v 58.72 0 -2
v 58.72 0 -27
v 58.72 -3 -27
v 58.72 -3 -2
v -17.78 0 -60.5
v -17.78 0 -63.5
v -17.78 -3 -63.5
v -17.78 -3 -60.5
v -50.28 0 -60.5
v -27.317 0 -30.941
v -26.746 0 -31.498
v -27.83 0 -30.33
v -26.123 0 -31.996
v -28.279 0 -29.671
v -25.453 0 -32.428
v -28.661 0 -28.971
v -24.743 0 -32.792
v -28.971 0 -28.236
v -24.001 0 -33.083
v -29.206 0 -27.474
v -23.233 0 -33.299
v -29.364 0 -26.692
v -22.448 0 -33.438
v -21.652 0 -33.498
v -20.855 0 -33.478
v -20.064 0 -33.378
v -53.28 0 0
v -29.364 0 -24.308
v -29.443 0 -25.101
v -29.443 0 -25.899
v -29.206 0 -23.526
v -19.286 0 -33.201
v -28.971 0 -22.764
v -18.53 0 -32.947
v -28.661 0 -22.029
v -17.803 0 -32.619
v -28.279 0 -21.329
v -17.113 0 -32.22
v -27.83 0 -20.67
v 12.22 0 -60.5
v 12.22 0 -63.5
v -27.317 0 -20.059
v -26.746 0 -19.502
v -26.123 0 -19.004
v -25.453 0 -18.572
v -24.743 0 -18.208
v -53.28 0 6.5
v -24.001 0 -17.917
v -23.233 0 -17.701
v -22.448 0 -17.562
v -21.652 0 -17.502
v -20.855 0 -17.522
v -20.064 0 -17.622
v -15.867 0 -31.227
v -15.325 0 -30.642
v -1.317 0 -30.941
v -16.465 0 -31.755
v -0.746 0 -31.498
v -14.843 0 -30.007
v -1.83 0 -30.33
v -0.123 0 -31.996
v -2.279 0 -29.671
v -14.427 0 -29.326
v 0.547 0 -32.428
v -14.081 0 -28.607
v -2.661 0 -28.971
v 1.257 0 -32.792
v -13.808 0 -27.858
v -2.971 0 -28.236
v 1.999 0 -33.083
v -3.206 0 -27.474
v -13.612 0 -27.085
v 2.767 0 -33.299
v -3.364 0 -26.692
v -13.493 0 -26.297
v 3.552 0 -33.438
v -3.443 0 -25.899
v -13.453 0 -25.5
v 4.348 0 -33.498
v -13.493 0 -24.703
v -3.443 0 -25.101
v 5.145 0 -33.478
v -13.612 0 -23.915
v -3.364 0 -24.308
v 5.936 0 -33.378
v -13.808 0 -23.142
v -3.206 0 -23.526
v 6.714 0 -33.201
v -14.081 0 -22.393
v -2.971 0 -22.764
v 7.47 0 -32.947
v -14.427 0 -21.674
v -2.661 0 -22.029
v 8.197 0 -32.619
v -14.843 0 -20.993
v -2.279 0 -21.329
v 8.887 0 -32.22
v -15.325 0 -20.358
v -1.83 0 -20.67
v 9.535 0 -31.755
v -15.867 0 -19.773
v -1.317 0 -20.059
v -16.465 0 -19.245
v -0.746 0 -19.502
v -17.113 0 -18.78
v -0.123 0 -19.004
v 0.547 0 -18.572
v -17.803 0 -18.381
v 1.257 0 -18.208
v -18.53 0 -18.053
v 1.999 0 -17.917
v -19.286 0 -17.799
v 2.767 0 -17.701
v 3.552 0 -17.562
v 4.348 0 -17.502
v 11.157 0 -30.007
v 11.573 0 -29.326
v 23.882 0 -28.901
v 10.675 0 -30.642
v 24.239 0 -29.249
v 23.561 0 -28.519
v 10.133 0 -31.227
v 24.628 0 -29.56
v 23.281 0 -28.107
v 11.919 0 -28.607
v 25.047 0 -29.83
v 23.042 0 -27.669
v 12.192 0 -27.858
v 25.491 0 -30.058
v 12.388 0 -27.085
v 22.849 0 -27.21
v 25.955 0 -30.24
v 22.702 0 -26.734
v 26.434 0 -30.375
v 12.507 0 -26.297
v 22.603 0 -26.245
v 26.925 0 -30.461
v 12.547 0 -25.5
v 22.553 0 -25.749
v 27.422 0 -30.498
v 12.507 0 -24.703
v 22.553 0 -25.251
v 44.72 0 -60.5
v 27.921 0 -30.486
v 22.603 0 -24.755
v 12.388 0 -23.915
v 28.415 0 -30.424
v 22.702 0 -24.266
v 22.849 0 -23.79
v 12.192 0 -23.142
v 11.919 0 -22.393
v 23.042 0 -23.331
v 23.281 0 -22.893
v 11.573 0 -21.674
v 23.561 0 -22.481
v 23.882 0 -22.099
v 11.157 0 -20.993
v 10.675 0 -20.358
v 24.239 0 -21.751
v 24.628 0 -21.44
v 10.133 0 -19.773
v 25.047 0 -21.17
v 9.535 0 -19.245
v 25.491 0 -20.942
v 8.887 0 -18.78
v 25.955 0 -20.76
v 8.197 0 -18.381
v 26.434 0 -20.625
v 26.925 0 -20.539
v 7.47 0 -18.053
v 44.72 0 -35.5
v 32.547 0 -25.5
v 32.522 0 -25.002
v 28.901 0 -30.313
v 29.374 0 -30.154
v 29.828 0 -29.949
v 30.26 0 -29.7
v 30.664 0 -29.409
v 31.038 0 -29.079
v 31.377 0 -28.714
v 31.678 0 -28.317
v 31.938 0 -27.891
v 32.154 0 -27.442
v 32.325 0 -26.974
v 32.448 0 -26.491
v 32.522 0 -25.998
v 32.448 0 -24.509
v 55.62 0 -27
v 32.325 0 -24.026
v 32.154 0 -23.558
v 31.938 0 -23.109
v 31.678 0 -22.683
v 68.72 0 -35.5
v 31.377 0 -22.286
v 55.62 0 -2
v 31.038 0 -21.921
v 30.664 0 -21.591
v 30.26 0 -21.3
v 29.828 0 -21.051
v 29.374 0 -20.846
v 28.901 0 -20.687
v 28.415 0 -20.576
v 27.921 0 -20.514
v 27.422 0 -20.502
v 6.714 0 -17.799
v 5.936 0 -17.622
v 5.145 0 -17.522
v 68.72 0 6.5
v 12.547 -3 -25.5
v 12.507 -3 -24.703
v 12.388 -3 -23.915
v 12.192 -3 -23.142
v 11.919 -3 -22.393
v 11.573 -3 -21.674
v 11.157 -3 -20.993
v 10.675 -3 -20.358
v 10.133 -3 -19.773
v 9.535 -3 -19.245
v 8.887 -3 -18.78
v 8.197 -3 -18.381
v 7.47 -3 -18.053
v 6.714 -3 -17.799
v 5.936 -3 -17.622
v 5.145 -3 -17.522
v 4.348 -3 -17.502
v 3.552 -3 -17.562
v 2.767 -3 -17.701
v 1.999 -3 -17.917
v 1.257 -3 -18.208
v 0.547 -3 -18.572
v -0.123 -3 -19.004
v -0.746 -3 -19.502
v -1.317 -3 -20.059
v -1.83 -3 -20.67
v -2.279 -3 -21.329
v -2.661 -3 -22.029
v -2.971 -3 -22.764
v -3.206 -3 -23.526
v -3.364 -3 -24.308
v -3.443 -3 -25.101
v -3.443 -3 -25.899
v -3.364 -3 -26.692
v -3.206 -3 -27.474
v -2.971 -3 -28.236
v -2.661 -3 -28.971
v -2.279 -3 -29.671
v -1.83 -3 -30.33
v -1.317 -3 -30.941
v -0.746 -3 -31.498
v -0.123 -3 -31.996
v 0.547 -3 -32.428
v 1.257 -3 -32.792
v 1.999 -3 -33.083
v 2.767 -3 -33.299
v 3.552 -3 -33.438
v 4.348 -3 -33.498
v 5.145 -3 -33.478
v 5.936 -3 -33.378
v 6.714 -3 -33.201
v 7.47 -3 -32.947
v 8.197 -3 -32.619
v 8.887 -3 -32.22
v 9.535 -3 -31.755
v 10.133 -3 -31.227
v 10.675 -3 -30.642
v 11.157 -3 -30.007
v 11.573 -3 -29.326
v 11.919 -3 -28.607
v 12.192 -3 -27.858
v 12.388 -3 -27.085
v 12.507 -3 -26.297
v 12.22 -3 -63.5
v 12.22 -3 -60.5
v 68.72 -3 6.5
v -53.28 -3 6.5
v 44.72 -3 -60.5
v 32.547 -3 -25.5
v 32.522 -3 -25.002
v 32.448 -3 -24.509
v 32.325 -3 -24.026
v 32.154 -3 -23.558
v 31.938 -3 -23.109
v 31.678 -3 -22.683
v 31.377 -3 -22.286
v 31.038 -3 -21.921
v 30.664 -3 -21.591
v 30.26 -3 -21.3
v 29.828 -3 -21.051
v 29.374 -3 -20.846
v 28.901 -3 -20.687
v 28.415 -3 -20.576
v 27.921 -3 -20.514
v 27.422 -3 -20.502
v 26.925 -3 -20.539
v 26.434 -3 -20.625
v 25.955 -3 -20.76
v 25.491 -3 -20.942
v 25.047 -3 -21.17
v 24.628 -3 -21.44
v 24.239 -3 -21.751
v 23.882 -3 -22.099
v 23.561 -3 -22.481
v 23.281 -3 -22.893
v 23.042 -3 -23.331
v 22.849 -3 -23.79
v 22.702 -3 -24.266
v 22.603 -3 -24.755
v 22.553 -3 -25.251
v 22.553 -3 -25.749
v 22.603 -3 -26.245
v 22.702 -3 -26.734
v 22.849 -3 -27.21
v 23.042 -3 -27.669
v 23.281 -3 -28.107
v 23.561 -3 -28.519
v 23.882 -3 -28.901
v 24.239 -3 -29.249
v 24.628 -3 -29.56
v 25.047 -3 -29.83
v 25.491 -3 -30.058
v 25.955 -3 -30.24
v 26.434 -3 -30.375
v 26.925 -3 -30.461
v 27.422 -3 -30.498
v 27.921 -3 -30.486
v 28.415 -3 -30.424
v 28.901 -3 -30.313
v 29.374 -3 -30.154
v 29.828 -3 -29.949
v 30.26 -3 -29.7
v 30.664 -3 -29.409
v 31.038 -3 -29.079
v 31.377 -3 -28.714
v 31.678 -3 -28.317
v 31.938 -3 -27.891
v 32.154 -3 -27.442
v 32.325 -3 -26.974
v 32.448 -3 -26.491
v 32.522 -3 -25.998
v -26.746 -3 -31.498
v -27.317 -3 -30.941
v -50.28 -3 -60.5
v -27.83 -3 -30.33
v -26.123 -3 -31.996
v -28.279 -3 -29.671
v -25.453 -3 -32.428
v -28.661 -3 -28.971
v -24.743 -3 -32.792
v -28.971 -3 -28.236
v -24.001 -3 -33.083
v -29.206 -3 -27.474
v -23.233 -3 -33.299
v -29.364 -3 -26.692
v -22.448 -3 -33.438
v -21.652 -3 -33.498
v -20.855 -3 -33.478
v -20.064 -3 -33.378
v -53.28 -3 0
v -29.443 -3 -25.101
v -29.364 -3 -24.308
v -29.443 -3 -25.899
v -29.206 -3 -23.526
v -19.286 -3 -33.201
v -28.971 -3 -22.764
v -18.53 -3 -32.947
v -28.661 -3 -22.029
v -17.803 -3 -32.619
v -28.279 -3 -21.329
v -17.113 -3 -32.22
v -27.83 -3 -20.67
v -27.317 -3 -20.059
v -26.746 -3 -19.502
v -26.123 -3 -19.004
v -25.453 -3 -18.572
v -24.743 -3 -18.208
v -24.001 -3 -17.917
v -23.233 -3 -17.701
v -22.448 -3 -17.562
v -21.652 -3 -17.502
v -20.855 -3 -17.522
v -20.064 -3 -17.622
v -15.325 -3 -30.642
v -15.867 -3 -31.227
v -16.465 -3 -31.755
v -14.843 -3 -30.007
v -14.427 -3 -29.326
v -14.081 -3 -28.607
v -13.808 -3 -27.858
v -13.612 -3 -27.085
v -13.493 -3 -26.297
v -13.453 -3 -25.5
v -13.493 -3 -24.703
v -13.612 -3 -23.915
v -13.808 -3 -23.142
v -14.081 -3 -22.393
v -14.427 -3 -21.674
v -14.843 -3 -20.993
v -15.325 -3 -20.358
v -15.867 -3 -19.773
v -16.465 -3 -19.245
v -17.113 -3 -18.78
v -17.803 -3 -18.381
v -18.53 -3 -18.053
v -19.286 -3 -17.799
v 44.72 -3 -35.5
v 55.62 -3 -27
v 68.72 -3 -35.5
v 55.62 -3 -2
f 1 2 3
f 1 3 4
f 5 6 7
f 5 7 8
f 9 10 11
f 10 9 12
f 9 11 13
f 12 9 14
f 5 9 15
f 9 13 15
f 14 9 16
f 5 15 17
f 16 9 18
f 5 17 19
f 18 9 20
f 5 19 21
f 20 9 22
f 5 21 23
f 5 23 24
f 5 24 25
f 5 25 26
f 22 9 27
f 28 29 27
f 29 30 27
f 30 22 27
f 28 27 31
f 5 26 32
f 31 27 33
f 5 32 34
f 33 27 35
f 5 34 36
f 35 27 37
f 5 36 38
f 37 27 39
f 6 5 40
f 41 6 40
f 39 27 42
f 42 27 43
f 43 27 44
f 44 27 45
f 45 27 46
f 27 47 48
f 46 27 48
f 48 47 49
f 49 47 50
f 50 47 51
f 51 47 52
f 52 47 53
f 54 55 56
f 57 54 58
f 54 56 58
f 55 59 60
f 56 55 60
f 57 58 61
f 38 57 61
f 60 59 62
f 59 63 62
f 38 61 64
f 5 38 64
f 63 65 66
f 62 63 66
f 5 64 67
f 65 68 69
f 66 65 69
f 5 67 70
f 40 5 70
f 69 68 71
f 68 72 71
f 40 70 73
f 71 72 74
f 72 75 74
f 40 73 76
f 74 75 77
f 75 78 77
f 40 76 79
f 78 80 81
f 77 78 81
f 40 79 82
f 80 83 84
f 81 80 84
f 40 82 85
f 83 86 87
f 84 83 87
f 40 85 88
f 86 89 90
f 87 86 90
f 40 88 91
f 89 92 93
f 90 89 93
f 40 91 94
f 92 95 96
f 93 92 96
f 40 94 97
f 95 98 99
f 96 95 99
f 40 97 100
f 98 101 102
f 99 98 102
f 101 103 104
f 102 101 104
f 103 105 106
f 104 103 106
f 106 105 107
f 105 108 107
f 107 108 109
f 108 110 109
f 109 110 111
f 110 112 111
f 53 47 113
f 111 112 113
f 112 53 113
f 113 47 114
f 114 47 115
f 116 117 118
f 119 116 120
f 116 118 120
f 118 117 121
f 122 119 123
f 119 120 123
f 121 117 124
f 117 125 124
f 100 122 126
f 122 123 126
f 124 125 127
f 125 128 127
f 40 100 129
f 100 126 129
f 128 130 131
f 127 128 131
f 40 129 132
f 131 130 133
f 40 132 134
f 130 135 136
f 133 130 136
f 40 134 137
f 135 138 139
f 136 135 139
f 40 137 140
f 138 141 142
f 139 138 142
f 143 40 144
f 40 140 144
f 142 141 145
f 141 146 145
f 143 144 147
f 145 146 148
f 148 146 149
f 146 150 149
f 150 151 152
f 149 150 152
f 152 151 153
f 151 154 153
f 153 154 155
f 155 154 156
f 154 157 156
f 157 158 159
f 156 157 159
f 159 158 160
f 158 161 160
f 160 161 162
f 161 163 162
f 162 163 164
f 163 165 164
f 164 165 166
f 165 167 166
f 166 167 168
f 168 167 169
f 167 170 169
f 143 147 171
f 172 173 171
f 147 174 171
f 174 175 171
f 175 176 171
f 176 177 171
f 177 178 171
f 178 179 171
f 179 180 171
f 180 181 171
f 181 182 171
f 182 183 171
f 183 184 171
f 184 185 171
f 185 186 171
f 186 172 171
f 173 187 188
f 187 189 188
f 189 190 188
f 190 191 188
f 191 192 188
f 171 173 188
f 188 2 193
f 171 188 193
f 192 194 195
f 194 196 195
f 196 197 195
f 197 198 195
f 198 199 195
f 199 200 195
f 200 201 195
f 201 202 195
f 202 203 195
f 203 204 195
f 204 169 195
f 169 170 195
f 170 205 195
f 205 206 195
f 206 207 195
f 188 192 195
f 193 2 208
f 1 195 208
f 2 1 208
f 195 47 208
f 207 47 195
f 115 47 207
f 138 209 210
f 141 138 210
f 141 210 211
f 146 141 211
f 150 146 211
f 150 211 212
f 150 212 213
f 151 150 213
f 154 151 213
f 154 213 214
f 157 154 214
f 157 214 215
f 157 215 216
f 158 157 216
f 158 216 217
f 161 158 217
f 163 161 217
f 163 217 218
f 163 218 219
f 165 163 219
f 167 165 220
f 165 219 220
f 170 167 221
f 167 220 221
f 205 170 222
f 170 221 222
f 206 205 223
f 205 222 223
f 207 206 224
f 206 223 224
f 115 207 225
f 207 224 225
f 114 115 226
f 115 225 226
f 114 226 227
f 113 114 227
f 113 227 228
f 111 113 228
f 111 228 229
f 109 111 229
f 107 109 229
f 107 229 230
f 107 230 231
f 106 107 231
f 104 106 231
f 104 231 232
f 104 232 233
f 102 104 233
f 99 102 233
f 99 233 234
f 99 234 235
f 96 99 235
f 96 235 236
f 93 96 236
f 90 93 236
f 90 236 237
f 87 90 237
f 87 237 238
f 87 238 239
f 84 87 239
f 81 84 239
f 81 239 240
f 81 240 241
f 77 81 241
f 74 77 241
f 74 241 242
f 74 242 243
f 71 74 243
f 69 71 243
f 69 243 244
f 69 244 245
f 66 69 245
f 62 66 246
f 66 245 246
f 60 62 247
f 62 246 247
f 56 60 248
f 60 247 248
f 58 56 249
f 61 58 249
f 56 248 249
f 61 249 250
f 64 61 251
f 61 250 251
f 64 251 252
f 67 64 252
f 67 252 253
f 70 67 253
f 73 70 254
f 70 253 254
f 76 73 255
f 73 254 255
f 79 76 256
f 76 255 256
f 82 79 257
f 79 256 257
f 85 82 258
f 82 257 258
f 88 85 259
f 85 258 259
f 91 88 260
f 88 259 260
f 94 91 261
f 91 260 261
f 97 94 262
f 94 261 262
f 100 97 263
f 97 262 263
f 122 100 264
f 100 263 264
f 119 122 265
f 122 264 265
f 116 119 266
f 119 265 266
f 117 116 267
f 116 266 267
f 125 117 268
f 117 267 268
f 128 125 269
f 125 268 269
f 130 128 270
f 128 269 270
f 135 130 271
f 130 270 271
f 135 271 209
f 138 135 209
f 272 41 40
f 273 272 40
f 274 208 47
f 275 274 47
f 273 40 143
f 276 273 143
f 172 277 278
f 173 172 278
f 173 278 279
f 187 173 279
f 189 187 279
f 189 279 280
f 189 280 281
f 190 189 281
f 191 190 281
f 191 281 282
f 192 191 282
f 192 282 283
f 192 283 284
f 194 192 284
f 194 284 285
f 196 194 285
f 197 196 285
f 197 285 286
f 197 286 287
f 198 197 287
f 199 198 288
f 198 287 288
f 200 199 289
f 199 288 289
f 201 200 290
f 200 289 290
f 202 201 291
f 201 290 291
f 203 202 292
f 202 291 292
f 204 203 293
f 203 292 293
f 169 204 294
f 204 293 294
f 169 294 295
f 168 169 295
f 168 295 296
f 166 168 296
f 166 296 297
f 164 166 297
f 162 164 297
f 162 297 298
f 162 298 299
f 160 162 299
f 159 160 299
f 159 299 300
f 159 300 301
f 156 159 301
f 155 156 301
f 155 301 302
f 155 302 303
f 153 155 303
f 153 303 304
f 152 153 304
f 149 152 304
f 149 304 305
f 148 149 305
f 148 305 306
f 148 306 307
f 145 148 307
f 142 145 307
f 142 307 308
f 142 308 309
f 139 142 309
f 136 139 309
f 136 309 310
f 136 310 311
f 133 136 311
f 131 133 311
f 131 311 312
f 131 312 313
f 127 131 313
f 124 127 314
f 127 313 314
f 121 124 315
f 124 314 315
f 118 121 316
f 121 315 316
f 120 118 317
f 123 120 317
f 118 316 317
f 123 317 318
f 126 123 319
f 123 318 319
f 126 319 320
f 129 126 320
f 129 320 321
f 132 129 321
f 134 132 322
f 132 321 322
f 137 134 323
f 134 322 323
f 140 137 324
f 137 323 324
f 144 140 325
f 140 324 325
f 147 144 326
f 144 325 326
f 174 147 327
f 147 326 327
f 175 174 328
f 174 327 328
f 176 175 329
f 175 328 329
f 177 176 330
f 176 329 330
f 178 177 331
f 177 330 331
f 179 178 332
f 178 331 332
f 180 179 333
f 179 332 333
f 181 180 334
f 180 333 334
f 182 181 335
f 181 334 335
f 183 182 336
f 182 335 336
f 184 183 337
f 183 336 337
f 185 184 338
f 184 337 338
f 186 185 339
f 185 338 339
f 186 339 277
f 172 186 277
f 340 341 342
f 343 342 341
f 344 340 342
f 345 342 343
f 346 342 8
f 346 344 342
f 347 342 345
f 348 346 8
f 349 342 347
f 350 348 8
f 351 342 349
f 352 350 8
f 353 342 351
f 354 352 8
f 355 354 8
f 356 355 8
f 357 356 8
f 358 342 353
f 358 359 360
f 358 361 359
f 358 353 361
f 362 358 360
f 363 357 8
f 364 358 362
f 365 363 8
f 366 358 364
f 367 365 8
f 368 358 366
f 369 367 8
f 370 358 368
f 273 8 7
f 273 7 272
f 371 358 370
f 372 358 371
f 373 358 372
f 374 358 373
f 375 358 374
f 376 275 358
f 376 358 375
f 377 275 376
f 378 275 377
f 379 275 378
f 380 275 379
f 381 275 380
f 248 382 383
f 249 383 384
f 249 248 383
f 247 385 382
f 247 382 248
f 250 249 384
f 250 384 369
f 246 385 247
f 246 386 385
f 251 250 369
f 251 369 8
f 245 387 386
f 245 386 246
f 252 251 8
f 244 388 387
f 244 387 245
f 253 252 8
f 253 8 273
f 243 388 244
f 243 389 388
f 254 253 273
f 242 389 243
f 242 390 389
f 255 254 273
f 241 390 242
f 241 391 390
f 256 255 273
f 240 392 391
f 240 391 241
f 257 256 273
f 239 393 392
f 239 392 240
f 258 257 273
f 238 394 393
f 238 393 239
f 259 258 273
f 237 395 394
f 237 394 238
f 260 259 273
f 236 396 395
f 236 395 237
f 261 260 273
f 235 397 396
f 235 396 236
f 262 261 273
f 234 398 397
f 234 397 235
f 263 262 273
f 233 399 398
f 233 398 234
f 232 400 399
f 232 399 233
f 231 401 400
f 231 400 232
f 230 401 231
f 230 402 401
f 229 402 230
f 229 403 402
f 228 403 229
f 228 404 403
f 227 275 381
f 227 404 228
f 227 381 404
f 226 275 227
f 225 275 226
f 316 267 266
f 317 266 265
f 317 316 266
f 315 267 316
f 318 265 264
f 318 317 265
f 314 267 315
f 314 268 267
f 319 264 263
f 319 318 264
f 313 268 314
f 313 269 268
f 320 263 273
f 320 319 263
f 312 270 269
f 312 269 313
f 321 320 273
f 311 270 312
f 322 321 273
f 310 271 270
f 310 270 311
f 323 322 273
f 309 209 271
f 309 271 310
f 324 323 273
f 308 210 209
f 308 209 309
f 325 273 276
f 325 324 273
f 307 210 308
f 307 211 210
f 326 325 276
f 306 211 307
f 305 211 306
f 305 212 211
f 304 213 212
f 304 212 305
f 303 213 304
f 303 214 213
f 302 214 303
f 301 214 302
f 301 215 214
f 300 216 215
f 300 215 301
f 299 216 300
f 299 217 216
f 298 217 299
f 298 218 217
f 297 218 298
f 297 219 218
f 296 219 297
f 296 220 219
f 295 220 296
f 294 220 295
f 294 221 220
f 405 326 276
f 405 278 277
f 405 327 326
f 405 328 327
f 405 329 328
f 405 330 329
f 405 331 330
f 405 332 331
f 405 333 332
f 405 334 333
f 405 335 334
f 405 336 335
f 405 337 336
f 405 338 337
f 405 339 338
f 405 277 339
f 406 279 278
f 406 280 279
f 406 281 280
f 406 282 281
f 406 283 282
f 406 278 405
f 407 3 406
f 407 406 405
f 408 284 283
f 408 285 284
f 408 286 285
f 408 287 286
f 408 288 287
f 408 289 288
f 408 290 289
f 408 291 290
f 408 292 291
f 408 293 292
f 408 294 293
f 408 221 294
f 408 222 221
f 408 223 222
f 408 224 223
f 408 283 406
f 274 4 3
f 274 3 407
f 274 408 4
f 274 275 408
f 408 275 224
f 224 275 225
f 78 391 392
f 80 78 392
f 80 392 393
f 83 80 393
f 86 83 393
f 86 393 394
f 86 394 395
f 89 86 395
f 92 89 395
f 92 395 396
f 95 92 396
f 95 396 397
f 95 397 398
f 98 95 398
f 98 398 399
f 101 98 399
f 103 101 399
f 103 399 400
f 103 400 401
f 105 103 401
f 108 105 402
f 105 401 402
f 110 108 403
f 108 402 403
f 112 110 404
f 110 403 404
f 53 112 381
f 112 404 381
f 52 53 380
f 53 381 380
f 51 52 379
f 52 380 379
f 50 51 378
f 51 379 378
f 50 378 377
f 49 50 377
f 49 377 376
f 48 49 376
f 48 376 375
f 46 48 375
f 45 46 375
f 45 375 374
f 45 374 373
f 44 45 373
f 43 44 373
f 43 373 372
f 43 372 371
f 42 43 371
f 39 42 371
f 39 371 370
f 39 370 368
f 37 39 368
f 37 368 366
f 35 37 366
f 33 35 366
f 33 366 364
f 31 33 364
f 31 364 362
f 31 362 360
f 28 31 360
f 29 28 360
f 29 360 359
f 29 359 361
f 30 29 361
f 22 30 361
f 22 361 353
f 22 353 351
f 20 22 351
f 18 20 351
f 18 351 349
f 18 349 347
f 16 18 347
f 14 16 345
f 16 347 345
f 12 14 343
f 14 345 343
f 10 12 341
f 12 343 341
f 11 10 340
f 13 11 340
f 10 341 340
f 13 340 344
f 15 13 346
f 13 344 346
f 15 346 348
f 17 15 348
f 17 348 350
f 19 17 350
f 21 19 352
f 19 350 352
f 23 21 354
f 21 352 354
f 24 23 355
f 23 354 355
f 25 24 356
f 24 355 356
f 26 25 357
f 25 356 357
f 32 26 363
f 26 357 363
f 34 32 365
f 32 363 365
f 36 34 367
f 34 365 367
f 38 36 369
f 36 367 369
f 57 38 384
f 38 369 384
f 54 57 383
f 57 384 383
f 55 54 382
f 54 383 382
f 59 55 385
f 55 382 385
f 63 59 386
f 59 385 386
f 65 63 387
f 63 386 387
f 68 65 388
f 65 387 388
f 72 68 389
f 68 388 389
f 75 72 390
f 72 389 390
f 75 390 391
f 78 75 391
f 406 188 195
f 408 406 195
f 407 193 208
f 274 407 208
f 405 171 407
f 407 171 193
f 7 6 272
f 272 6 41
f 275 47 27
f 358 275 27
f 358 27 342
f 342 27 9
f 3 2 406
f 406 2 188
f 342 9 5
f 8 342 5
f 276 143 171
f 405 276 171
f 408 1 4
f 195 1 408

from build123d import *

# Parameters (mm, degrees)
F0_W     = 30
F0_H     = 3
F1_DEPTH = 3
F2_W     = 3.1
F2_H     = 25
F3_DEPTH = 25
F4_R     = 8
F4_R_2   = 5
F5_DEPTH = 25


with BuildPart() as f1:
    # F0 (on Front) → F1 (new body)
    with BuildSketch(Plane.XZ):
        Polygon((68.720056, 6.5), (44.720056, 6.5), (-50.279944, 6.5), (-53.279944, 6.5), (-53.279944, 0), (-50.279944, -60.5), (-17.779944, -60.5), (12.220056, -60.5), (44.720056, -60.5), (44.720056, -35.5), (68.720056, -35.5), align=None)
        with Locations((-2.779944, -62)):
            Rectangle(F0_W, F0_H)
    extrude(amount=F1_DEPTH)

    # F2 (on face) → F3 (cut)
    with BuildSketch(Plane(origin=(0, 0, 0), x_dir=(-1, 0, 0), z_dir=(0, 1, 0))):
        with Locations((-57.170056, -14.5)):
            Rectangle(F2_W, F2_H)
    extrude(amount=-F3_DEPTH, mode=Mode.SUBTRACT)

    # F4 (on face) → F5 (cut)
    with BuildSketch(Plane.XZ.offset(3)):
        with Locations((-21.452965, -25.5)):
            Circle(F4_R)
        with Locations((4.547035, -25.5)):
            Circle(F4_R)
        with Locations((27.547035, -25.5)):
            Circle(F4_R_2)
    extrude(amount=-F5_DEPTH, mode=Mode.SUBTRACT)


solid = f1.part
